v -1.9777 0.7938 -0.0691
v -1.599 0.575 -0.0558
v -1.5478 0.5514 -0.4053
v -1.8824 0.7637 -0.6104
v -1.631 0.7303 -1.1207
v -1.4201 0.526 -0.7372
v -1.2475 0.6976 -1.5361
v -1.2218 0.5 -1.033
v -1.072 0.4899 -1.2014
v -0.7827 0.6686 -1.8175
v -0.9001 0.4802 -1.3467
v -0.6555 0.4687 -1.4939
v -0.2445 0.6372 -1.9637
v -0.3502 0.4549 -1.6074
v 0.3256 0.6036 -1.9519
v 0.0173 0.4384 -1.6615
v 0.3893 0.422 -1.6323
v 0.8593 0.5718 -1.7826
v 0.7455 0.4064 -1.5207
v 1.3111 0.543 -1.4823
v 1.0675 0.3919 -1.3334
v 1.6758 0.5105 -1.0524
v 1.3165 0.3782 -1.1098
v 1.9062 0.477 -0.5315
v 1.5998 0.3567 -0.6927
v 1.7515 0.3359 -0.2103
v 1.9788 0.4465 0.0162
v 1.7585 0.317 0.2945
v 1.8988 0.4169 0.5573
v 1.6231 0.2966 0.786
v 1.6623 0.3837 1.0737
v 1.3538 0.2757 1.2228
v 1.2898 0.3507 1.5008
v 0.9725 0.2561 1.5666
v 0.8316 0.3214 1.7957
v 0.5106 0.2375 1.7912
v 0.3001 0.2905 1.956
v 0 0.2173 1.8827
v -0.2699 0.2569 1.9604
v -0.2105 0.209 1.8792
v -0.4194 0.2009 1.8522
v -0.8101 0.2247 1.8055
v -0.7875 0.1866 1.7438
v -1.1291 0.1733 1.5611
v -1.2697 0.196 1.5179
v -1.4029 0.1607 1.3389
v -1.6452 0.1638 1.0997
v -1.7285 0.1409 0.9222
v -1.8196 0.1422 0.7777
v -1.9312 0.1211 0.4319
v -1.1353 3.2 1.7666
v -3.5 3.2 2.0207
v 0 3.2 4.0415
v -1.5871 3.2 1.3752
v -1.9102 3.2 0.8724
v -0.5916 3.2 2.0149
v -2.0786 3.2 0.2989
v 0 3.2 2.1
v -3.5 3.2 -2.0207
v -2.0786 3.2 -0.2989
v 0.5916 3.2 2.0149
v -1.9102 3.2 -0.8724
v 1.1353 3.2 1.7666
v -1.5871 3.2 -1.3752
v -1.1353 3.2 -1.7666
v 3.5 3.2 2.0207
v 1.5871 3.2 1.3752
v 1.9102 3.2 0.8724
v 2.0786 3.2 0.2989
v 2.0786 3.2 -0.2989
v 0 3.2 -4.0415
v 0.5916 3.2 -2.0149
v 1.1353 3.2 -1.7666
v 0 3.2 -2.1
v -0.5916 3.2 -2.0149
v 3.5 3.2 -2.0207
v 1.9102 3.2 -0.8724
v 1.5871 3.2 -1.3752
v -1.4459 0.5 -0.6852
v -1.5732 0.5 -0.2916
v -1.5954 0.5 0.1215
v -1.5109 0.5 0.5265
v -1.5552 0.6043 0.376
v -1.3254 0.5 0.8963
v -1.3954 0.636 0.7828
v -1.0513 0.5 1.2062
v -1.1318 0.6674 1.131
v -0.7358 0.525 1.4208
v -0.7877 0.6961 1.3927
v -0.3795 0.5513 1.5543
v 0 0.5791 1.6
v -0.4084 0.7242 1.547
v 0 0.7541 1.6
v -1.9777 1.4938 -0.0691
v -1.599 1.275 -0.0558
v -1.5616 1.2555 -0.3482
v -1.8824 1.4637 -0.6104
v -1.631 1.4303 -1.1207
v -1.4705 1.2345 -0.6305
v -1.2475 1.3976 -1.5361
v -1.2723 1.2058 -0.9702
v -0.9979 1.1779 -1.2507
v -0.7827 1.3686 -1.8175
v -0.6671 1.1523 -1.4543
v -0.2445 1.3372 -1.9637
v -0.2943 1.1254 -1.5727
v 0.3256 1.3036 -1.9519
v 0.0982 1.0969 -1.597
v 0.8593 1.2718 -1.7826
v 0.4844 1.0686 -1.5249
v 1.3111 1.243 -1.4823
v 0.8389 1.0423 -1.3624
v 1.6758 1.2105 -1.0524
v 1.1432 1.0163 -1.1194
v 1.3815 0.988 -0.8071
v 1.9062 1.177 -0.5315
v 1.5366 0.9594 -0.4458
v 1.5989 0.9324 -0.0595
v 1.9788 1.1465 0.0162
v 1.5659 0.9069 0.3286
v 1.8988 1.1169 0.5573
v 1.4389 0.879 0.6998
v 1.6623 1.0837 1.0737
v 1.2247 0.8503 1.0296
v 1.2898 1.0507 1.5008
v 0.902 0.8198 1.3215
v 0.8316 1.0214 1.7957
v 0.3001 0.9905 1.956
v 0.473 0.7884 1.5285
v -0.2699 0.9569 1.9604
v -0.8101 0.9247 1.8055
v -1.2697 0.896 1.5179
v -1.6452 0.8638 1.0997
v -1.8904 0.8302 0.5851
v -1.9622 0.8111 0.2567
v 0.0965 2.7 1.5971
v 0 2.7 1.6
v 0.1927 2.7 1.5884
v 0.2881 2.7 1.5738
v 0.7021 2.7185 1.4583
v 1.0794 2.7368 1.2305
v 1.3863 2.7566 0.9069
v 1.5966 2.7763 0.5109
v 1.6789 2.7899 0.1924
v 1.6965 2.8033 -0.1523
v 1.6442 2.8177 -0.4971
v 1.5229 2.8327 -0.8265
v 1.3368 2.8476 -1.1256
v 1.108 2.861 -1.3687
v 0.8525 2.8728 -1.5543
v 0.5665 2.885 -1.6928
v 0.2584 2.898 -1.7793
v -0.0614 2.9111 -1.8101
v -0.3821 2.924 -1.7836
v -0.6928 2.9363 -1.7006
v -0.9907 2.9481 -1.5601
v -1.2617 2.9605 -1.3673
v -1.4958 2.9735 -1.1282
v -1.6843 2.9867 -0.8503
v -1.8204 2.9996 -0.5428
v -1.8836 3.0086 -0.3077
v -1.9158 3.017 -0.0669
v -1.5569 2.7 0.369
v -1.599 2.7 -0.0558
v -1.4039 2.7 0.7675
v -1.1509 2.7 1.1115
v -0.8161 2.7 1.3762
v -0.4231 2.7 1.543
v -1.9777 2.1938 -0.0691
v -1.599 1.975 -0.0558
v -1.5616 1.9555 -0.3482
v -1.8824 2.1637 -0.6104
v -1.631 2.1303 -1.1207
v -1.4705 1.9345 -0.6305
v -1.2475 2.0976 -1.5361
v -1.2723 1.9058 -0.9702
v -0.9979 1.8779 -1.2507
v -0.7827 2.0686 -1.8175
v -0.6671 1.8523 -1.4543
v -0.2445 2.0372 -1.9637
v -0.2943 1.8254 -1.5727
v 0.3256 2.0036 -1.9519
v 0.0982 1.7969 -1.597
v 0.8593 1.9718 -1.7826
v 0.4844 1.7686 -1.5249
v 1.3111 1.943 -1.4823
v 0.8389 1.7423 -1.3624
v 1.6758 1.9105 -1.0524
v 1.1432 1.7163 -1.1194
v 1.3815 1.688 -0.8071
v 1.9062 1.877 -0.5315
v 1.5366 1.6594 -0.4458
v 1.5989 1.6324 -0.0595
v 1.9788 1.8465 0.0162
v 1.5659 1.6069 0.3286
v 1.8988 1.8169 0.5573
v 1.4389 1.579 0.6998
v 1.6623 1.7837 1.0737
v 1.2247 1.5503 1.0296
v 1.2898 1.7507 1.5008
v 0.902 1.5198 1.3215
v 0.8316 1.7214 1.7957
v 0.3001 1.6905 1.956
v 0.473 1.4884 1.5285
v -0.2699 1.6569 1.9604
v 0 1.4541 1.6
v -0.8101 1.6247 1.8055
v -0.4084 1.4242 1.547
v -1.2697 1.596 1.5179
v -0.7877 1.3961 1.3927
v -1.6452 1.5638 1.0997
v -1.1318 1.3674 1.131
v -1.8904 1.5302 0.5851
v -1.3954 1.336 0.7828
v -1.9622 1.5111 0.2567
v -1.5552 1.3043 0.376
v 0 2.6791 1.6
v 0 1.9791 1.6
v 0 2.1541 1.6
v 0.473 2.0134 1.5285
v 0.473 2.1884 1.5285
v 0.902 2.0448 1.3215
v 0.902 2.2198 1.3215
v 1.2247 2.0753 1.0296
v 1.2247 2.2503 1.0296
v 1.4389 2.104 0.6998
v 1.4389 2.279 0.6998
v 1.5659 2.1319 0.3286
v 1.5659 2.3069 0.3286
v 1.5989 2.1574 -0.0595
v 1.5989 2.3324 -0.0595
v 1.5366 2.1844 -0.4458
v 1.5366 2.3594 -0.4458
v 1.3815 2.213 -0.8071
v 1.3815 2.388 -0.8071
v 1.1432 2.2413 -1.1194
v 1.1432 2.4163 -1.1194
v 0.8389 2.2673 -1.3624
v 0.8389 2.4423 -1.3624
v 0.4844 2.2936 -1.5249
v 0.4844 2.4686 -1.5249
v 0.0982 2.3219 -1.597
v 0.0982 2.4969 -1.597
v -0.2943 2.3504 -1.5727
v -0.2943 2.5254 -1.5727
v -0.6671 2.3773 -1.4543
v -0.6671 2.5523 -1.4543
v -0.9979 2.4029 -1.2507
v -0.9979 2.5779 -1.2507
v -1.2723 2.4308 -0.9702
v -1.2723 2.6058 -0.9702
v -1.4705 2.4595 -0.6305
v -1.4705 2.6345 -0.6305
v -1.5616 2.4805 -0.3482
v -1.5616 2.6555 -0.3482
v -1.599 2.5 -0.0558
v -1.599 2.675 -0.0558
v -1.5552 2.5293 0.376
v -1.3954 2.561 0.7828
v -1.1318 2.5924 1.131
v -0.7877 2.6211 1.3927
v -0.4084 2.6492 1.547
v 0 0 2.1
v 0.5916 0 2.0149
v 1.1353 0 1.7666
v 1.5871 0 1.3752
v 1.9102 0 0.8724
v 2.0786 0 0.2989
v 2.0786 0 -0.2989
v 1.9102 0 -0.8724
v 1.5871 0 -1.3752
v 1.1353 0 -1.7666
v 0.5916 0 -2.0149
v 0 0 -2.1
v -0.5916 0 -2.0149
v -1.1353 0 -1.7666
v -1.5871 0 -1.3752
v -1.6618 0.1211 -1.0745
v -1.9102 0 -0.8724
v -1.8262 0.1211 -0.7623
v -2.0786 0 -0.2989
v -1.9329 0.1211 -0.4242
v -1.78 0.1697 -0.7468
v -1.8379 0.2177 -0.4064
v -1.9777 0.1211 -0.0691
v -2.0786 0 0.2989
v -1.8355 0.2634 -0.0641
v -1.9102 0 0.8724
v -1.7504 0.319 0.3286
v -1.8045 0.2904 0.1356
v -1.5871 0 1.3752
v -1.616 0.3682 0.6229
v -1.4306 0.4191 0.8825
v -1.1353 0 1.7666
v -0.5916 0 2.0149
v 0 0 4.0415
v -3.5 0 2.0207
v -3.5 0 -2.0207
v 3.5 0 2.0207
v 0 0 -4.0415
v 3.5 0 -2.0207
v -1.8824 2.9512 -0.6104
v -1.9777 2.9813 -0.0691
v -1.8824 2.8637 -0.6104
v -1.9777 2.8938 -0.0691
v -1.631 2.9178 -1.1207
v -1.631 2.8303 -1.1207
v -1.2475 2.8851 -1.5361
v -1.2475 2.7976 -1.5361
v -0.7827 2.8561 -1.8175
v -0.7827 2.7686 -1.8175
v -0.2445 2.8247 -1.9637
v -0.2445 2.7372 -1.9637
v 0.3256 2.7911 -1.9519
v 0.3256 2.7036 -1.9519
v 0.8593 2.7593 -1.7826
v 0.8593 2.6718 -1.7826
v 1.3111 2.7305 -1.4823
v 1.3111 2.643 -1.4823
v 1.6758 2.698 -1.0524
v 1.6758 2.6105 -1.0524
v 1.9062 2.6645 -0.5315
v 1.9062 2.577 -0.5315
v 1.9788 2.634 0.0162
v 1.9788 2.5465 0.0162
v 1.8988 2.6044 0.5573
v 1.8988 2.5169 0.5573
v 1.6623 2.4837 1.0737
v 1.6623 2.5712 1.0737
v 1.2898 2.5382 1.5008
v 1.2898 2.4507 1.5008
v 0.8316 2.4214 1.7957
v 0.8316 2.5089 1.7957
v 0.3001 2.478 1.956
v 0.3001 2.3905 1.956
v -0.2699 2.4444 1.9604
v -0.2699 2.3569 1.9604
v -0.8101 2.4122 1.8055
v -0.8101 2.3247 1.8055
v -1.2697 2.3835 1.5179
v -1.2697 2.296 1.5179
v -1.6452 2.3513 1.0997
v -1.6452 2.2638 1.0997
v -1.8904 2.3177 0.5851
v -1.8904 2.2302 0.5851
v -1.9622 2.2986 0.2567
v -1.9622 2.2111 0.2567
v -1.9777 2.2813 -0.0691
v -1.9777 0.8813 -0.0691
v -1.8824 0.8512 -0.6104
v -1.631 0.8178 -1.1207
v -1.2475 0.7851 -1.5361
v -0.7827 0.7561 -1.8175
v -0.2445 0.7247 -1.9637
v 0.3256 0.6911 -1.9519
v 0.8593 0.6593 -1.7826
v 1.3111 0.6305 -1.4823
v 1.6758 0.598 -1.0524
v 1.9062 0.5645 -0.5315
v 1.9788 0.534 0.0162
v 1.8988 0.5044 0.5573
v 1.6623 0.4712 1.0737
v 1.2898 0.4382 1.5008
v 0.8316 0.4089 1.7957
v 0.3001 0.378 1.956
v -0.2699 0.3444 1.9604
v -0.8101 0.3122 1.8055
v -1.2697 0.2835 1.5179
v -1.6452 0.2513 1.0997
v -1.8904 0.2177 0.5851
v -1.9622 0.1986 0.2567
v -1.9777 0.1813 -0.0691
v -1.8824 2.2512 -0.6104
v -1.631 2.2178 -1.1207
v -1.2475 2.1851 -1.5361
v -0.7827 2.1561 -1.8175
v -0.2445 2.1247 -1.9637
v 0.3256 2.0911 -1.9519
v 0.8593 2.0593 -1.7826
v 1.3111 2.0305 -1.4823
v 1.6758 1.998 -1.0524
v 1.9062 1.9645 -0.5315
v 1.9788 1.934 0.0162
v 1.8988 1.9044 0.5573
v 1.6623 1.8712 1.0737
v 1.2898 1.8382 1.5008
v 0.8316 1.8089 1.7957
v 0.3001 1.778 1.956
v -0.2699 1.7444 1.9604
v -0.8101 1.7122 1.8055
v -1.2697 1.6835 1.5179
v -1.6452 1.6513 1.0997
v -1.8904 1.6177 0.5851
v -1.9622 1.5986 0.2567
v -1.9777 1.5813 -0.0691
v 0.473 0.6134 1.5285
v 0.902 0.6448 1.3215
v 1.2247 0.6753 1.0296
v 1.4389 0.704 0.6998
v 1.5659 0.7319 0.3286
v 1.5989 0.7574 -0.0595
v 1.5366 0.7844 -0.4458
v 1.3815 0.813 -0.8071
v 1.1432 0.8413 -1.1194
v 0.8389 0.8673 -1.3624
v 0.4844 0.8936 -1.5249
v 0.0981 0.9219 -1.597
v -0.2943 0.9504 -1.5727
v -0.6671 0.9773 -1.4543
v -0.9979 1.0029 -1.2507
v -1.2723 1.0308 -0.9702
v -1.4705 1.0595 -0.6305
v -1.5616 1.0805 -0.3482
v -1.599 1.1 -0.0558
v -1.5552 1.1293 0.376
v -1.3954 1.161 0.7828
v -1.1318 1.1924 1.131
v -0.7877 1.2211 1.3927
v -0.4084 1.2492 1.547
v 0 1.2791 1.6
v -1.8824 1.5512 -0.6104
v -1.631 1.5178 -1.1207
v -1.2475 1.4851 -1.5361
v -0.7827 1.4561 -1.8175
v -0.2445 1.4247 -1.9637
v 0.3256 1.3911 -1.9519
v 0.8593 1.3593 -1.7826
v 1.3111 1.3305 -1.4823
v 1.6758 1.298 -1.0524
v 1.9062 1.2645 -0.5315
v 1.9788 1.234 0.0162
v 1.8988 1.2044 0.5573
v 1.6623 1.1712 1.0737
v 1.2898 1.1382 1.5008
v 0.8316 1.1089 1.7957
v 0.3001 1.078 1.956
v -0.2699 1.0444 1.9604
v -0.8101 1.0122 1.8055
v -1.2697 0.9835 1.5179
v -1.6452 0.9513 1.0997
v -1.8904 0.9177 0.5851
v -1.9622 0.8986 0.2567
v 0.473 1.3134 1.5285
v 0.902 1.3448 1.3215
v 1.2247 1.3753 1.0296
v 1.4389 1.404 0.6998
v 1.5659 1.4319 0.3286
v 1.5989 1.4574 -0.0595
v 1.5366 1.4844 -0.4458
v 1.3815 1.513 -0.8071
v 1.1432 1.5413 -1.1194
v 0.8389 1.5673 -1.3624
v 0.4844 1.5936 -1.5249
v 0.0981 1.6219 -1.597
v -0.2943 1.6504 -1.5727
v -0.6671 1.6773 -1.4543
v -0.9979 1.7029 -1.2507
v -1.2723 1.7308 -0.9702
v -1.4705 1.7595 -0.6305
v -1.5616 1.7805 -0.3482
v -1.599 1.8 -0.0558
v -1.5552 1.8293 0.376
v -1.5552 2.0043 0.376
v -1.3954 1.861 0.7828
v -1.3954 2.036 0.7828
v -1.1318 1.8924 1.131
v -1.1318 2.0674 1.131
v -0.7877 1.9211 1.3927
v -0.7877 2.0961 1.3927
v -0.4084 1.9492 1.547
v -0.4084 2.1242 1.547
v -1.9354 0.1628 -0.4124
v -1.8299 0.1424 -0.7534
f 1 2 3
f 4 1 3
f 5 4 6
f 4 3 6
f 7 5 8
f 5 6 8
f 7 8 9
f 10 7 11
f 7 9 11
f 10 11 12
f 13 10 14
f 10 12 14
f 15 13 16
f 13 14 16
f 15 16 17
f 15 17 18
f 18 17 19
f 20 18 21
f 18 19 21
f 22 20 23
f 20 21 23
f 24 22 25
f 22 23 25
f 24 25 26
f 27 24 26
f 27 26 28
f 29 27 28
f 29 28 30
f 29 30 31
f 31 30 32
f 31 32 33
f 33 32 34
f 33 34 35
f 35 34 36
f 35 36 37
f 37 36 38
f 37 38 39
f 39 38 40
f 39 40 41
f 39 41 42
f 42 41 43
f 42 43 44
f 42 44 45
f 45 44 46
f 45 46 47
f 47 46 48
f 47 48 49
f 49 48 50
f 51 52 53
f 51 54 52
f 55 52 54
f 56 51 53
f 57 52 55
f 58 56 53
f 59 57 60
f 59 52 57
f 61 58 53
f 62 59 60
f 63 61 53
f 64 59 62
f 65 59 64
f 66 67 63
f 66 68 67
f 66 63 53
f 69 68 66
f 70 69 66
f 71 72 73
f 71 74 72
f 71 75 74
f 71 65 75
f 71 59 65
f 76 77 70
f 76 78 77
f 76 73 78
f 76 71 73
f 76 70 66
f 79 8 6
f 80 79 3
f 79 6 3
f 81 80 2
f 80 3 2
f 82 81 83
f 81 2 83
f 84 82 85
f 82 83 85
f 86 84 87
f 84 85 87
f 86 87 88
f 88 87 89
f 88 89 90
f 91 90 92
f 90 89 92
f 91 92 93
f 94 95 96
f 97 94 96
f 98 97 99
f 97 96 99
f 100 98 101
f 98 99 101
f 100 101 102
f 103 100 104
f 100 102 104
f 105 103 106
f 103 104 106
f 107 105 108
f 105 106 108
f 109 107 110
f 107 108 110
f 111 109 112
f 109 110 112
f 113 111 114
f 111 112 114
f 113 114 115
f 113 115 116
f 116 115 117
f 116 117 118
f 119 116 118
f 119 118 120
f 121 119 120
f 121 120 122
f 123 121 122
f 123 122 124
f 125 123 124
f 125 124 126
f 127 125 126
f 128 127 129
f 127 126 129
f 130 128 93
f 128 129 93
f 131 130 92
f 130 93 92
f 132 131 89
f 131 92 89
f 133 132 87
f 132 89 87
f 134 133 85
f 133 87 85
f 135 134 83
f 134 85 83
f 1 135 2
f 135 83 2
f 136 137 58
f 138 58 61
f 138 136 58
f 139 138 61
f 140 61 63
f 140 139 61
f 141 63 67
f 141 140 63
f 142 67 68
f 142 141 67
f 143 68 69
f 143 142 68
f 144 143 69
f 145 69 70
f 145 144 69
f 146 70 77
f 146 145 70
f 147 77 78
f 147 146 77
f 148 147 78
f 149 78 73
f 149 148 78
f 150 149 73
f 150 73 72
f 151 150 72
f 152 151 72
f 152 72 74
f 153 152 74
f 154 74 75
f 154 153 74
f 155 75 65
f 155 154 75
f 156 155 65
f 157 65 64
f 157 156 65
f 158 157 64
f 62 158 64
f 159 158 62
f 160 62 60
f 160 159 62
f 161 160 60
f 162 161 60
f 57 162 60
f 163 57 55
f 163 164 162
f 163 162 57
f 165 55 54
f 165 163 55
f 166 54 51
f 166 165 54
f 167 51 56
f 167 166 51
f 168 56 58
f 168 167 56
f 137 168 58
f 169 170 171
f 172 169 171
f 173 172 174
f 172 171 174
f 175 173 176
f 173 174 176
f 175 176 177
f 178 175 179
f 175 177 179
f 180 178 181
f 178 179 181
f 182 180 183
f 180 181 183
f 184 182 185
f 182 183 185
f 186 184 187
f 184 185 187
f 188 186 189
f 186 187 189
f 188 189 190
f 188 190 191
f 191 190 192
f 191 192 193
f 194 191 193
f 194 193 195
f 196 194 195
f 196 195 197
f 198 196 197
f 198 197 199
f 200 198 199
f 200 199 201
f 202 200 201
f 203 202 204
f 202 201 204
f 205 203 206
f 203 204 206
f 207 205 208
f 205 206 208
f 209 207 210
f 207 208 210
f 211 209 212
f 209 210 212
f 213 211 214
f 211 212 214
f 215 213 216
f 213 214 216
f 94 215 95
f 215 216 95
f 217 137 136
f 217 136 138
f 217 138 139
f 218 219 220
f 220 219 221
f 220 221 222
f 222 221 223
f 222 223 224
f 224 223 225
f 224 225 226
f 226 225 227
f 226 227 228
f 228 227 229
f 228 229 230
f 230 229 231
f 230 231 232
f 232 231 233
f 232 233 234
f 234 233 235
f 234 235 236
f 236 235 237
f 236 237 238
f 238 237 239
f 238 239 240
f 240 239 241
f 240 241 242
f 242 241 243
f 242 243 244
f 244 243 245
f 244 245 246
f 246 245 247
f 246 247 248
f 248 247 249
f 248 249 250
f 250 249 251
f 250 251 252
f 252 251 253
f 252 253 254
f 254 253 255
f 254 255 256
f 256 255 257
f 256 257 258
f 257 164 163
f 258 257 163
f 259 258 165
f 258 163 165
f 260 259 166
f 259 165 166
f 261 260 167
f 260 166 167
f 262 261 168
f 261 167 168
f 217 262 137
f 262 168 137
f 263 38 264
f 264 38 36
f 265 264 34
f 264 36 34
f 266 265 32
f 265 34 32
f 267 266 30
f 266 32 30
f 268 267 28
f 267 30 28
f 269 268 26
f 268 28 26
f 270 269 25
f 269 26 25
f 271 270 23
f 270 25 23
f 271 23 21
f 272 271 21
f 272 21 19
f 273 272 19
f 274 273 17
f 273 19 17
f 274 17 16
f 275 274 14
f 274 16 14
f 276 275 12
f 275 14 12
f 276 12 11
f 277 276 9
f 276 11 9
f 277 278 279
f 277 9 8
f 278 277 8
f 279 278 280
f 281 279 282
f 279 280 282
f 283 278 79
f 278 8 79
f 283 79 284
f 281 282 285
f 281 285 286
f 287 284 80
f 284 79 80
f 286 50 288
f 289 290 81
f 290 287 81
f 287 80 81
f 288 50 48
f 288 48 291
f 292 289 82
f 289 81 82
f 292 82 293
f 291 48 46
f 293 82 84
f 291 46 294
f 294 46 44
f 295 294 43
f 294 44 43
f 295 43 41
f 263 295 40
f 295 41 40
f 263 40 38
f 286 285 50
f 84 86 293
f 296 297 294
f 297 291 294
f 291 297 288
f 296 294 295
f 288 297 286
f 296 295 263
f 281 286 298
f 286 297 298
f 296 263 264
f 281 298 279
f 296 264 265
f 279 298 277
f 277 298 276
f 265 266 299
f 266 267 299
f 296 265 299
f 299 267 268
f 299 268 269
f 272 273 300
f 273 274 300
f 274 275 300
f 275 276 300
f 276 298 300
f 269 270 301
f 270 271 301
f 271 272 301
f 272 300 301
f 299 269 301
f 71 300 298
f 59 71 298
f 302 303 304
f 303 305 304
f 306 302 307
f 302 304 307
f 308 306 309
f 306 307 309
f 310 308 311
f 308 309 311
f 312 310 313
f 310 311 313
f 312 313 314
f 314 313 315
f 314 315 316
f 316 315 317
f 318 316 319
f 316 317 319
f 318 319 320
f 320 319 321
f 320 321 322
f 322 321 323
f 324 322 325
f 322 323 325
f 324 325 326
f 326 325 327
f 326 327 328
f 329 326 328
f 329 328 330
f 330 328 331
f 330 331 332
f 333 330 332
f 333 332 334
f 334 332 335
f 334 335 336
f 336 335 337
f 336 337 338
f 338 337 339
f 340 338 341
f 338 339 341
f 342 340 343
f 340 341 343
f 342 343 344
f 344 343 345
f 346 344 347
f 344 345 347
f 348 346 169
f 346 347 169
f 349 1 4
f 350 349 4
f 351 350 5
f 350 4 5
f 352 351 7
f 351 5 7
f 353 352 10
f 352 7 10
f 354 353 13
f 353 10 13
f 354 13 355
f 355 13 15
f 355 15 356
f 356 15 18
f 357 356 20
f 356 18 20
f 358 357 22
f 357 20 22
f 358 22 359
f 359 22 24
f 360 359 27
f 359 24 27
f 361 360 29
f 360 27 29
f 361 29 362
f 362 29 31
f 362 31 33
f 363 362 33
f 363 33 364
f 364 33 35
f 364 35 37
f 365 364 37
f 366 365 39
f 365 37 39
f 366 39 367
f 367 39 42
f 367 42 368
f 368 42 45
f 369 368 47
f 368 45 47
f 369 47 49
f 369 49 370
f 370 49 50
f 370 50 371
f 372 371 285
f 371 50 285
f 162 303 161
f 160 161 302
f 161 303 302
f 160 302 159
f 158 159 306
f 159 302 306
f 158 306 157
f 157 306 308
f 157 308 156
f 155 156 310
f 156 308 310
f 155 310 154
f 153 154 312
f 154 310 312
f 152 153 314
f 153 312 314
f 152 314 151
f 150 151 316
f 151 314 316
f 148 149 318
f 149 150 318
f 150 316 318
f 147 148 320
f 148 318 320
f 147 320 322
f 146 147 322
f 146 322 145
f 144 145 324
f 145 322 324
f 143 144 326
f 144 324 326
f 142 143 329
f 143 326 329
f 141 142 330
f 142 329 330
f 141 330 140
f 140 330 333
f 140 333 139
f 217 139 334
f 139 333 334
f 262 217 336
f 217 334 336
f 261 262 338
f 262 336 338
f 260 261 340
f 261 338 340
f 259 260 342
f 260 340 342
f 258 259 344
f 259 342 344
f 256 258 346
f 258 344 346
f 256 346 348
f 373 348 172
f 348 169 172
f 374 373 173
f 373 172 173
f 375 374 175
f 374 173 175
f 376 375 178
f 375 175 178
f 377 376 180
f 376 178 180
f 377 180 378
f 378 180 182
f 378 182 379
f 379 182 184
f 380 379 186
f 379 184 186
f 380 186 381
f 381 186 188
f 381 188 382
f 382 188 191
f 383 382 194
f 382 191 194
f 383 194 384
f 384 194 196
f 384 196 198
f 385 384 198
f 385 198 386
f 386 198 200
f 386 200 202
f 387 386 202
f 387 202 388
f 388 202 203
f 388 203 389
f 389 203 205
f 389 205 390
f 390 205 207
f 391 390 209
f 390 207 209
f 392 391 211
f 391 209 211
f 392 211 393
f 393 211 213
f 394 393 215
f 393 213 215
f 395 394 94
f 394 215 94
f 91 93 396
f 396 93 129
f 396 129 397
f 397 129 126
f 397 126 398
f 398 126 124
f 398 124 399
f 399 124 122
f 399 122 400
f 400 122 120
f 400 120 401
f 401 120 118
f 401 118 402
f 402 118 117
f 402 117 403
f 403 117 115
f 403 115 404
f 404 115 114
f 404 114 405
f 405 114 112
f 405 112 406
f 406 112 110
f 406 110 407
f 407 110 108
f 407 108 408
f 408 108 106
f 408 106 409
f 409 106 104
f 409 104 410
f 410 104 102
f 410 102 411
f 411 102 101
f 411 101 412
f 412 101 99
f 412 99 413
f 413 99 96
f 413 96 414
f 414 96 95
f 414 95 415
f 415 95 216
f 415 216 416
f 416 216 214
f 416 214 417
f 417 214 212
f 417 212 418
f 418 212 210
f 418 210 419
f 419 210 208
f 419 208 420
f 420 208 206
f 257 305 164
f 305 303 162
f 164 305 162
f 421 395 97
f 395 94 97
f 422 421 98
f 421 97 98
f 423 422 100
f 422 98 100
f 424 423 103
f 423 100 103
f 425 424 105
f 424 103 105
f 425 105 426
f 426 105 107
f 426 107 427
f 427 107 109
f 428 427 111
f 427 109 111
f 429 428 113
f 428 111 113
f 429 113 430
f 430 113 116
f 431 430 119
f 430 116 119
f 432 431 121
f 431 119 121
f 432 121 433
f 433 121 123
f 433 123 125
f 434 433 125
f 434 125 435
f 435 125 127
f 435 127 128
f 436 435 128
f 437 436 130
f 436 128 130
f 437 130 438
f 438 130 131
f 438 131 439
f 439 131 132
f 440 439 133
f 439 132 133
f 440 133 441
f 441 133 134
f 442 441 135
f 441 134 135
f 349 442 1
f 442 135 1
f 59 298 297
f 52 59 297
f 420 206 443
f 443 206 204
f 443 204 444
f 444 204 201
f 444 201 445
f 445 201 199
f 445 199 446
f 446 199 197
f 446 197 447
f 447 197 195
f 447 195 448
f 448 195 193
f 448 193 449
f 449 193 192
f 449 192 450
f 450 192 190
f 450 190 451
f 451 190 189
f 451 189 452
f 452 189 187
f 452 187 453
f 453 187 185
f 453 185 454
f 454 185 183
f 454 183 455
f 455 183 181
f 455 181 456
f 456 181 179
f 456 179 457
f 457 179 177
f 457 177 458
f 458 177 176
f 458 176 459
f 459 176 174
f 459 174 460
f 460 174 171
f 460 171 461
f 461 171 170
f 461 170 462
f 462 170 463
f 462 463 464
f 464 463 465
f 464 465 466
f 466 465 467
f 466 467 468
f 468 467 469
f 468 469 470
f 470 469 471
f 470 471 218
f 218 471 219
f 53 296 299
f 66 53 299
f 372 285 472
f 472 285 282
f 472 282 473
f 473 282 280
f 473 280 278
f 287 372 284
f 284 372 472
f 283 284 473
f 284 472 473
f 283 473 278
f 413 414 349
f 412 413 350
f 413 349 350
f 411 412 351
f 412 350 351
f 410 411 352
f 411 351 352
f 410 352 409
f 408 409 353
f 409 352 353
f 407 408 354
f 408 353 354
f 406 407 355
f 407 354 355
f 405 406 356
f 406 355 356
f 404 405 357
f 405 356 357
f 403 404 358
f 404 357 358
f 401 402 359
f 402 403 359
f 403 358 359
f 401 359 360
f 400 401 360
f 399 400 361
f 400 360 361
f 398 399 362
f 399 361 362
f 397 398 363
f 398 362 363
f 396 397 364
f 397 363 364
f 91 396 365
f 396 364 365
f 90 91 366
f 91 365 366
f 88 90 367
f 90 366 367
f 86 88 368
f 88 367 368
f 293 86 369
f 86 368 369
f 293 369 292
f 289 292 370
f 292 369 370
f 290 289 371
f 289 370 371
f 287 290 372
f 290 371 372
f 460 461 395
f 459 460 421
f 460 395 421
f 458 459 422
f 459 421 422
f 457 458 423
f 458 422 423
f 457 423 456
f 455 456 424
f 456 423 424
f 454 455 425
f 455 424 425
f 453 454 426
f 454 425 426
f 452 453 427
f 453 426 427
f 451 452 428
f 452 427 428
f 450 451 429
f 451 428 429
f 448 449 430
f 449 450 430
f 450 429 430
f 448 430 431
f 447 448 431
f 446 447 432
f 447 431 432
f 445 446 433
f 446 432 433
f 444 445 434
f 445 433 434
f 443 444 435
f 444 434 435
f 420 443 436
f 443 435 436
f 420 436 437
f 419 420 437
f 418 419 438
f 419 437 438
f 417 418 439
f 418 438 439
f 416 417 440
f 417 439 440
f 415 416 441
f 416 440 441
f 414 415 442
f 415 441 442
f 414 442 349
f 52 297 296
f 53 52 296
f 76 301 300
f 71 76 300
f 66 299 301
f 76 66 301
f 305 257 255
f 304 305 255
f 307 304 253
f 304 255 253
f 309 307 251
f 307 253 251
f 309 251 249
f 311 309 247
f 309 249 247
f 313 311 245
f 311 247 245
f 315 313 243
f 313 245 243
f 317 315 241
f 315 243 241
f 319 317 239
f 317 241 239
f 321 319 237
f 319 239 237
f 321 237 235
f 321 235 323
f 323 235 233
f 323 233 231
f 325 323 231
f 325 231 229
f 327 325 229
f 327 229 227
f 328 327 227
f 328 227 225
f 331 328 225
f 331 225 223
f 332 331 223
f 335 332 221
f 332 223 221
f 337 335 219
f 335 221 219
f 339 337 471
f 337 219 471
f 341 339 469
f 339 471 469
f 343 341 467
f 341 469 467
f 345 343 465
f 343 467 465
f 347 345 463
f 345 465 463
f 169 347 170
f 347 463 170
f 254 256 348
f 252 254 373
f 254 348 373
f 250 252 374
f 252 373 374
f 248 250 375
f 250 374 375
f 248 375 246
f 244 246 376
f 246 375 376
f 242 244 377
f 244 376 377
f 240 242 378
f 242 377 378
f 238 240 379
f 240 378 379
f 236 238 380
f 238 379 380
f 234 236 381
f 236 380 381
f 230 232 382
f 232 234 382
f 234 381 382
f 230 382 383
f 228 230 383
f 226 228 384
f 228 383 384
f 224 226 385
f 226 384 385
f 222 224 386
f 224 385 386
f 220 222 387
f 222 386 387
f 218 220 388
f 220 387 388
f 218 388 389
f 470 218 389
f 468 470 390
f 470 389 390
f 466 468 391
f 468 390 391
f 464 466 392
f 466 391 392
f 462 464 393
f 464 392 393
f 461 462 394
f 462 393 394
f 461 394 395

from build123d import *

# Parameters (mm, degrees)
BOSS_EXTRUDE1_DEPTH = 3.2
SKETCH2_R           = 1.6
CUT_EXTRUDE1_DEPTH  = 3.2
CHAMFER1_SIZE       = 0.5
THREAD1_PITCH       = 0.7


with BuildPart() as part:
    # Sketch1 → Boss-Extrude1 (new body)
    with BuildSketch(Plane(origin=(0, 0, 0), x_dir=(1, 0, 0), z_dir=(0, 1, 0))):
        Polygon((0, 4.041451884), (-3.5, 2.020725942), (-3.5, -2.020725942), (0, -4.041451884), (3.5, -2.020725942), (3.5, 2.020725942), align=None)
    extrude(amount=BOSS_EXTRUDE1_DEPTH)

    # Sketch2 → Cut-Extrude1 (cut)
    with BuildSketch(Plane(origin=(0, 3.2, 0), x_dir=(1, 0, 0), z_dir=(0, 1, 0))):
        with Locations(Location((0, 0, 0), (0, 0, 270))):
            Circle(SKETCH2_R)
    extrude(amount=-CUT_EXTRUDE1_DEPTH, mode=Mode.SUBTRACT)

    # Chamfer1
    chamfer1_edges = [part.edges().sort_by_distance(p)[0] for p in [
        (0, 0, -1.6),
        (0, 3.2, -1.6),
    ]]
    chamfer(chamfer1_edges, length=CHAMFER1_SIZE)

    # Thread1: the profile of Thread Profile1 profile screwed along a right-hand helix of 4.571429 turns, 6 arcs to a turn; built about Z, then put on its axis
    thread1_z = Axis((0, 0, 0), (0, 0, 1))
    thread1_corners = [(1.5997, 0, -0.000173205), (1.978886113, -1e-09, 0.218749999), (1.978886113, -1e-09, 0.306249999), (1.5997, 0, 0.525173203)]
    with BuildLine(mode=Mode.PRIVATE) as thread1_profile:
        Line(thread1_corners[0], thread1_corners[1])
        Line(thread1_corners[1], thread1_corners[2])
        Line(thread1_corners[2], thread1_corners[3])
        Line(thread1_corners[3], thread1_corners[0])
    thread1_cap = Face(thread1_profile.wire())
    thread1_turn_angles = [0, 30, 60, 90, 120, 150, 180, 210, 240, 270, 300, 330, 360]
    thread1_turn_weights = [1, 0.8660254037844387, 1, 0.8660254037844387, 1, 0.8660254037844387, 1, 0.8660254037844387, 1, 0.8660254037844387, 1, 0.8660254037844387, 1]
    thread1_turn_rails = [Edge.make_bspline([Vector(p[0], p[1], 0).rotate(thread1_z, thread1_turn_angles[k]) / thread1_turn_weights[k] + Vector(0, 0, p[2] + THREAD1_PITCH * thread1_turn_angles[k] / 360) for k in range(13)], [0, 0, 0, 1, 1, 2, 2, 3, 3, 4, 4, 5, 5, 6, 6, 6], 2, thread1_turn_weights) for p in thread1_corners]
    thread1_turn_sides = [Face.make_surface_from_curves(thread1_turn_rails[p[0]], thread1_turn_rails[p[1]]) for p in [(0, 1), (1, 2), (2, 3), (3, 0)]]
    thread1_last_angles = [1440, 1470, 1500, 1530, 1560, 1590, 1620, 1632.857142857, 1645.714285714]
    thread1_last_weights = [1, 0.8660254037844387, 1, 0.8660254037844387, 1, 0.8660254037844387, 1, 0.9749279121818266, 1]
    thread1_last_rails = [Edge.make_bspline([Vector(p[0], p[1], 0).rotate(thread1_z, thread1_last_angles[k]) / thread1_last_weights[k] + Vector(0, 0, p[2] + THREAD1_PITCH * thread1_last_angles[k] / 360) for k in range(9)], [0, 0, 0, 1, 1, 2, 2, 3, 3, 4, 4, 4], 2, thread1_last_weights) for p in thread1_corners]
    thread1_last_sides = [Face.make_surface_from_curves(thread1_last_rails[p[0]], thread1_last_rails[p[1]]) for p in [(0, 1), (1, 2), (2, 3), (3, 0)]]
    thread1 = Plane(origin=(0, 3.2, 0), x_dir=(-0.999390827, 0, -0.034899497), z_dir=(0, -1, 0)) * Solid(Shell([*[p.moved(Location((0, 0, THREAD1_PITCH * i))) for i in range(4) for p in thread1_turn_sides], *thread1_last_sides, thread1_cap, thread1_cap.rotate(thread1_z, 1645.714285714).moved(Location((0, 0, THREAD1_PITCH * 1645.714285714 / 360)))]))
    add(thread1, mode=Mode.SUBTRACT)


solid = part.part
